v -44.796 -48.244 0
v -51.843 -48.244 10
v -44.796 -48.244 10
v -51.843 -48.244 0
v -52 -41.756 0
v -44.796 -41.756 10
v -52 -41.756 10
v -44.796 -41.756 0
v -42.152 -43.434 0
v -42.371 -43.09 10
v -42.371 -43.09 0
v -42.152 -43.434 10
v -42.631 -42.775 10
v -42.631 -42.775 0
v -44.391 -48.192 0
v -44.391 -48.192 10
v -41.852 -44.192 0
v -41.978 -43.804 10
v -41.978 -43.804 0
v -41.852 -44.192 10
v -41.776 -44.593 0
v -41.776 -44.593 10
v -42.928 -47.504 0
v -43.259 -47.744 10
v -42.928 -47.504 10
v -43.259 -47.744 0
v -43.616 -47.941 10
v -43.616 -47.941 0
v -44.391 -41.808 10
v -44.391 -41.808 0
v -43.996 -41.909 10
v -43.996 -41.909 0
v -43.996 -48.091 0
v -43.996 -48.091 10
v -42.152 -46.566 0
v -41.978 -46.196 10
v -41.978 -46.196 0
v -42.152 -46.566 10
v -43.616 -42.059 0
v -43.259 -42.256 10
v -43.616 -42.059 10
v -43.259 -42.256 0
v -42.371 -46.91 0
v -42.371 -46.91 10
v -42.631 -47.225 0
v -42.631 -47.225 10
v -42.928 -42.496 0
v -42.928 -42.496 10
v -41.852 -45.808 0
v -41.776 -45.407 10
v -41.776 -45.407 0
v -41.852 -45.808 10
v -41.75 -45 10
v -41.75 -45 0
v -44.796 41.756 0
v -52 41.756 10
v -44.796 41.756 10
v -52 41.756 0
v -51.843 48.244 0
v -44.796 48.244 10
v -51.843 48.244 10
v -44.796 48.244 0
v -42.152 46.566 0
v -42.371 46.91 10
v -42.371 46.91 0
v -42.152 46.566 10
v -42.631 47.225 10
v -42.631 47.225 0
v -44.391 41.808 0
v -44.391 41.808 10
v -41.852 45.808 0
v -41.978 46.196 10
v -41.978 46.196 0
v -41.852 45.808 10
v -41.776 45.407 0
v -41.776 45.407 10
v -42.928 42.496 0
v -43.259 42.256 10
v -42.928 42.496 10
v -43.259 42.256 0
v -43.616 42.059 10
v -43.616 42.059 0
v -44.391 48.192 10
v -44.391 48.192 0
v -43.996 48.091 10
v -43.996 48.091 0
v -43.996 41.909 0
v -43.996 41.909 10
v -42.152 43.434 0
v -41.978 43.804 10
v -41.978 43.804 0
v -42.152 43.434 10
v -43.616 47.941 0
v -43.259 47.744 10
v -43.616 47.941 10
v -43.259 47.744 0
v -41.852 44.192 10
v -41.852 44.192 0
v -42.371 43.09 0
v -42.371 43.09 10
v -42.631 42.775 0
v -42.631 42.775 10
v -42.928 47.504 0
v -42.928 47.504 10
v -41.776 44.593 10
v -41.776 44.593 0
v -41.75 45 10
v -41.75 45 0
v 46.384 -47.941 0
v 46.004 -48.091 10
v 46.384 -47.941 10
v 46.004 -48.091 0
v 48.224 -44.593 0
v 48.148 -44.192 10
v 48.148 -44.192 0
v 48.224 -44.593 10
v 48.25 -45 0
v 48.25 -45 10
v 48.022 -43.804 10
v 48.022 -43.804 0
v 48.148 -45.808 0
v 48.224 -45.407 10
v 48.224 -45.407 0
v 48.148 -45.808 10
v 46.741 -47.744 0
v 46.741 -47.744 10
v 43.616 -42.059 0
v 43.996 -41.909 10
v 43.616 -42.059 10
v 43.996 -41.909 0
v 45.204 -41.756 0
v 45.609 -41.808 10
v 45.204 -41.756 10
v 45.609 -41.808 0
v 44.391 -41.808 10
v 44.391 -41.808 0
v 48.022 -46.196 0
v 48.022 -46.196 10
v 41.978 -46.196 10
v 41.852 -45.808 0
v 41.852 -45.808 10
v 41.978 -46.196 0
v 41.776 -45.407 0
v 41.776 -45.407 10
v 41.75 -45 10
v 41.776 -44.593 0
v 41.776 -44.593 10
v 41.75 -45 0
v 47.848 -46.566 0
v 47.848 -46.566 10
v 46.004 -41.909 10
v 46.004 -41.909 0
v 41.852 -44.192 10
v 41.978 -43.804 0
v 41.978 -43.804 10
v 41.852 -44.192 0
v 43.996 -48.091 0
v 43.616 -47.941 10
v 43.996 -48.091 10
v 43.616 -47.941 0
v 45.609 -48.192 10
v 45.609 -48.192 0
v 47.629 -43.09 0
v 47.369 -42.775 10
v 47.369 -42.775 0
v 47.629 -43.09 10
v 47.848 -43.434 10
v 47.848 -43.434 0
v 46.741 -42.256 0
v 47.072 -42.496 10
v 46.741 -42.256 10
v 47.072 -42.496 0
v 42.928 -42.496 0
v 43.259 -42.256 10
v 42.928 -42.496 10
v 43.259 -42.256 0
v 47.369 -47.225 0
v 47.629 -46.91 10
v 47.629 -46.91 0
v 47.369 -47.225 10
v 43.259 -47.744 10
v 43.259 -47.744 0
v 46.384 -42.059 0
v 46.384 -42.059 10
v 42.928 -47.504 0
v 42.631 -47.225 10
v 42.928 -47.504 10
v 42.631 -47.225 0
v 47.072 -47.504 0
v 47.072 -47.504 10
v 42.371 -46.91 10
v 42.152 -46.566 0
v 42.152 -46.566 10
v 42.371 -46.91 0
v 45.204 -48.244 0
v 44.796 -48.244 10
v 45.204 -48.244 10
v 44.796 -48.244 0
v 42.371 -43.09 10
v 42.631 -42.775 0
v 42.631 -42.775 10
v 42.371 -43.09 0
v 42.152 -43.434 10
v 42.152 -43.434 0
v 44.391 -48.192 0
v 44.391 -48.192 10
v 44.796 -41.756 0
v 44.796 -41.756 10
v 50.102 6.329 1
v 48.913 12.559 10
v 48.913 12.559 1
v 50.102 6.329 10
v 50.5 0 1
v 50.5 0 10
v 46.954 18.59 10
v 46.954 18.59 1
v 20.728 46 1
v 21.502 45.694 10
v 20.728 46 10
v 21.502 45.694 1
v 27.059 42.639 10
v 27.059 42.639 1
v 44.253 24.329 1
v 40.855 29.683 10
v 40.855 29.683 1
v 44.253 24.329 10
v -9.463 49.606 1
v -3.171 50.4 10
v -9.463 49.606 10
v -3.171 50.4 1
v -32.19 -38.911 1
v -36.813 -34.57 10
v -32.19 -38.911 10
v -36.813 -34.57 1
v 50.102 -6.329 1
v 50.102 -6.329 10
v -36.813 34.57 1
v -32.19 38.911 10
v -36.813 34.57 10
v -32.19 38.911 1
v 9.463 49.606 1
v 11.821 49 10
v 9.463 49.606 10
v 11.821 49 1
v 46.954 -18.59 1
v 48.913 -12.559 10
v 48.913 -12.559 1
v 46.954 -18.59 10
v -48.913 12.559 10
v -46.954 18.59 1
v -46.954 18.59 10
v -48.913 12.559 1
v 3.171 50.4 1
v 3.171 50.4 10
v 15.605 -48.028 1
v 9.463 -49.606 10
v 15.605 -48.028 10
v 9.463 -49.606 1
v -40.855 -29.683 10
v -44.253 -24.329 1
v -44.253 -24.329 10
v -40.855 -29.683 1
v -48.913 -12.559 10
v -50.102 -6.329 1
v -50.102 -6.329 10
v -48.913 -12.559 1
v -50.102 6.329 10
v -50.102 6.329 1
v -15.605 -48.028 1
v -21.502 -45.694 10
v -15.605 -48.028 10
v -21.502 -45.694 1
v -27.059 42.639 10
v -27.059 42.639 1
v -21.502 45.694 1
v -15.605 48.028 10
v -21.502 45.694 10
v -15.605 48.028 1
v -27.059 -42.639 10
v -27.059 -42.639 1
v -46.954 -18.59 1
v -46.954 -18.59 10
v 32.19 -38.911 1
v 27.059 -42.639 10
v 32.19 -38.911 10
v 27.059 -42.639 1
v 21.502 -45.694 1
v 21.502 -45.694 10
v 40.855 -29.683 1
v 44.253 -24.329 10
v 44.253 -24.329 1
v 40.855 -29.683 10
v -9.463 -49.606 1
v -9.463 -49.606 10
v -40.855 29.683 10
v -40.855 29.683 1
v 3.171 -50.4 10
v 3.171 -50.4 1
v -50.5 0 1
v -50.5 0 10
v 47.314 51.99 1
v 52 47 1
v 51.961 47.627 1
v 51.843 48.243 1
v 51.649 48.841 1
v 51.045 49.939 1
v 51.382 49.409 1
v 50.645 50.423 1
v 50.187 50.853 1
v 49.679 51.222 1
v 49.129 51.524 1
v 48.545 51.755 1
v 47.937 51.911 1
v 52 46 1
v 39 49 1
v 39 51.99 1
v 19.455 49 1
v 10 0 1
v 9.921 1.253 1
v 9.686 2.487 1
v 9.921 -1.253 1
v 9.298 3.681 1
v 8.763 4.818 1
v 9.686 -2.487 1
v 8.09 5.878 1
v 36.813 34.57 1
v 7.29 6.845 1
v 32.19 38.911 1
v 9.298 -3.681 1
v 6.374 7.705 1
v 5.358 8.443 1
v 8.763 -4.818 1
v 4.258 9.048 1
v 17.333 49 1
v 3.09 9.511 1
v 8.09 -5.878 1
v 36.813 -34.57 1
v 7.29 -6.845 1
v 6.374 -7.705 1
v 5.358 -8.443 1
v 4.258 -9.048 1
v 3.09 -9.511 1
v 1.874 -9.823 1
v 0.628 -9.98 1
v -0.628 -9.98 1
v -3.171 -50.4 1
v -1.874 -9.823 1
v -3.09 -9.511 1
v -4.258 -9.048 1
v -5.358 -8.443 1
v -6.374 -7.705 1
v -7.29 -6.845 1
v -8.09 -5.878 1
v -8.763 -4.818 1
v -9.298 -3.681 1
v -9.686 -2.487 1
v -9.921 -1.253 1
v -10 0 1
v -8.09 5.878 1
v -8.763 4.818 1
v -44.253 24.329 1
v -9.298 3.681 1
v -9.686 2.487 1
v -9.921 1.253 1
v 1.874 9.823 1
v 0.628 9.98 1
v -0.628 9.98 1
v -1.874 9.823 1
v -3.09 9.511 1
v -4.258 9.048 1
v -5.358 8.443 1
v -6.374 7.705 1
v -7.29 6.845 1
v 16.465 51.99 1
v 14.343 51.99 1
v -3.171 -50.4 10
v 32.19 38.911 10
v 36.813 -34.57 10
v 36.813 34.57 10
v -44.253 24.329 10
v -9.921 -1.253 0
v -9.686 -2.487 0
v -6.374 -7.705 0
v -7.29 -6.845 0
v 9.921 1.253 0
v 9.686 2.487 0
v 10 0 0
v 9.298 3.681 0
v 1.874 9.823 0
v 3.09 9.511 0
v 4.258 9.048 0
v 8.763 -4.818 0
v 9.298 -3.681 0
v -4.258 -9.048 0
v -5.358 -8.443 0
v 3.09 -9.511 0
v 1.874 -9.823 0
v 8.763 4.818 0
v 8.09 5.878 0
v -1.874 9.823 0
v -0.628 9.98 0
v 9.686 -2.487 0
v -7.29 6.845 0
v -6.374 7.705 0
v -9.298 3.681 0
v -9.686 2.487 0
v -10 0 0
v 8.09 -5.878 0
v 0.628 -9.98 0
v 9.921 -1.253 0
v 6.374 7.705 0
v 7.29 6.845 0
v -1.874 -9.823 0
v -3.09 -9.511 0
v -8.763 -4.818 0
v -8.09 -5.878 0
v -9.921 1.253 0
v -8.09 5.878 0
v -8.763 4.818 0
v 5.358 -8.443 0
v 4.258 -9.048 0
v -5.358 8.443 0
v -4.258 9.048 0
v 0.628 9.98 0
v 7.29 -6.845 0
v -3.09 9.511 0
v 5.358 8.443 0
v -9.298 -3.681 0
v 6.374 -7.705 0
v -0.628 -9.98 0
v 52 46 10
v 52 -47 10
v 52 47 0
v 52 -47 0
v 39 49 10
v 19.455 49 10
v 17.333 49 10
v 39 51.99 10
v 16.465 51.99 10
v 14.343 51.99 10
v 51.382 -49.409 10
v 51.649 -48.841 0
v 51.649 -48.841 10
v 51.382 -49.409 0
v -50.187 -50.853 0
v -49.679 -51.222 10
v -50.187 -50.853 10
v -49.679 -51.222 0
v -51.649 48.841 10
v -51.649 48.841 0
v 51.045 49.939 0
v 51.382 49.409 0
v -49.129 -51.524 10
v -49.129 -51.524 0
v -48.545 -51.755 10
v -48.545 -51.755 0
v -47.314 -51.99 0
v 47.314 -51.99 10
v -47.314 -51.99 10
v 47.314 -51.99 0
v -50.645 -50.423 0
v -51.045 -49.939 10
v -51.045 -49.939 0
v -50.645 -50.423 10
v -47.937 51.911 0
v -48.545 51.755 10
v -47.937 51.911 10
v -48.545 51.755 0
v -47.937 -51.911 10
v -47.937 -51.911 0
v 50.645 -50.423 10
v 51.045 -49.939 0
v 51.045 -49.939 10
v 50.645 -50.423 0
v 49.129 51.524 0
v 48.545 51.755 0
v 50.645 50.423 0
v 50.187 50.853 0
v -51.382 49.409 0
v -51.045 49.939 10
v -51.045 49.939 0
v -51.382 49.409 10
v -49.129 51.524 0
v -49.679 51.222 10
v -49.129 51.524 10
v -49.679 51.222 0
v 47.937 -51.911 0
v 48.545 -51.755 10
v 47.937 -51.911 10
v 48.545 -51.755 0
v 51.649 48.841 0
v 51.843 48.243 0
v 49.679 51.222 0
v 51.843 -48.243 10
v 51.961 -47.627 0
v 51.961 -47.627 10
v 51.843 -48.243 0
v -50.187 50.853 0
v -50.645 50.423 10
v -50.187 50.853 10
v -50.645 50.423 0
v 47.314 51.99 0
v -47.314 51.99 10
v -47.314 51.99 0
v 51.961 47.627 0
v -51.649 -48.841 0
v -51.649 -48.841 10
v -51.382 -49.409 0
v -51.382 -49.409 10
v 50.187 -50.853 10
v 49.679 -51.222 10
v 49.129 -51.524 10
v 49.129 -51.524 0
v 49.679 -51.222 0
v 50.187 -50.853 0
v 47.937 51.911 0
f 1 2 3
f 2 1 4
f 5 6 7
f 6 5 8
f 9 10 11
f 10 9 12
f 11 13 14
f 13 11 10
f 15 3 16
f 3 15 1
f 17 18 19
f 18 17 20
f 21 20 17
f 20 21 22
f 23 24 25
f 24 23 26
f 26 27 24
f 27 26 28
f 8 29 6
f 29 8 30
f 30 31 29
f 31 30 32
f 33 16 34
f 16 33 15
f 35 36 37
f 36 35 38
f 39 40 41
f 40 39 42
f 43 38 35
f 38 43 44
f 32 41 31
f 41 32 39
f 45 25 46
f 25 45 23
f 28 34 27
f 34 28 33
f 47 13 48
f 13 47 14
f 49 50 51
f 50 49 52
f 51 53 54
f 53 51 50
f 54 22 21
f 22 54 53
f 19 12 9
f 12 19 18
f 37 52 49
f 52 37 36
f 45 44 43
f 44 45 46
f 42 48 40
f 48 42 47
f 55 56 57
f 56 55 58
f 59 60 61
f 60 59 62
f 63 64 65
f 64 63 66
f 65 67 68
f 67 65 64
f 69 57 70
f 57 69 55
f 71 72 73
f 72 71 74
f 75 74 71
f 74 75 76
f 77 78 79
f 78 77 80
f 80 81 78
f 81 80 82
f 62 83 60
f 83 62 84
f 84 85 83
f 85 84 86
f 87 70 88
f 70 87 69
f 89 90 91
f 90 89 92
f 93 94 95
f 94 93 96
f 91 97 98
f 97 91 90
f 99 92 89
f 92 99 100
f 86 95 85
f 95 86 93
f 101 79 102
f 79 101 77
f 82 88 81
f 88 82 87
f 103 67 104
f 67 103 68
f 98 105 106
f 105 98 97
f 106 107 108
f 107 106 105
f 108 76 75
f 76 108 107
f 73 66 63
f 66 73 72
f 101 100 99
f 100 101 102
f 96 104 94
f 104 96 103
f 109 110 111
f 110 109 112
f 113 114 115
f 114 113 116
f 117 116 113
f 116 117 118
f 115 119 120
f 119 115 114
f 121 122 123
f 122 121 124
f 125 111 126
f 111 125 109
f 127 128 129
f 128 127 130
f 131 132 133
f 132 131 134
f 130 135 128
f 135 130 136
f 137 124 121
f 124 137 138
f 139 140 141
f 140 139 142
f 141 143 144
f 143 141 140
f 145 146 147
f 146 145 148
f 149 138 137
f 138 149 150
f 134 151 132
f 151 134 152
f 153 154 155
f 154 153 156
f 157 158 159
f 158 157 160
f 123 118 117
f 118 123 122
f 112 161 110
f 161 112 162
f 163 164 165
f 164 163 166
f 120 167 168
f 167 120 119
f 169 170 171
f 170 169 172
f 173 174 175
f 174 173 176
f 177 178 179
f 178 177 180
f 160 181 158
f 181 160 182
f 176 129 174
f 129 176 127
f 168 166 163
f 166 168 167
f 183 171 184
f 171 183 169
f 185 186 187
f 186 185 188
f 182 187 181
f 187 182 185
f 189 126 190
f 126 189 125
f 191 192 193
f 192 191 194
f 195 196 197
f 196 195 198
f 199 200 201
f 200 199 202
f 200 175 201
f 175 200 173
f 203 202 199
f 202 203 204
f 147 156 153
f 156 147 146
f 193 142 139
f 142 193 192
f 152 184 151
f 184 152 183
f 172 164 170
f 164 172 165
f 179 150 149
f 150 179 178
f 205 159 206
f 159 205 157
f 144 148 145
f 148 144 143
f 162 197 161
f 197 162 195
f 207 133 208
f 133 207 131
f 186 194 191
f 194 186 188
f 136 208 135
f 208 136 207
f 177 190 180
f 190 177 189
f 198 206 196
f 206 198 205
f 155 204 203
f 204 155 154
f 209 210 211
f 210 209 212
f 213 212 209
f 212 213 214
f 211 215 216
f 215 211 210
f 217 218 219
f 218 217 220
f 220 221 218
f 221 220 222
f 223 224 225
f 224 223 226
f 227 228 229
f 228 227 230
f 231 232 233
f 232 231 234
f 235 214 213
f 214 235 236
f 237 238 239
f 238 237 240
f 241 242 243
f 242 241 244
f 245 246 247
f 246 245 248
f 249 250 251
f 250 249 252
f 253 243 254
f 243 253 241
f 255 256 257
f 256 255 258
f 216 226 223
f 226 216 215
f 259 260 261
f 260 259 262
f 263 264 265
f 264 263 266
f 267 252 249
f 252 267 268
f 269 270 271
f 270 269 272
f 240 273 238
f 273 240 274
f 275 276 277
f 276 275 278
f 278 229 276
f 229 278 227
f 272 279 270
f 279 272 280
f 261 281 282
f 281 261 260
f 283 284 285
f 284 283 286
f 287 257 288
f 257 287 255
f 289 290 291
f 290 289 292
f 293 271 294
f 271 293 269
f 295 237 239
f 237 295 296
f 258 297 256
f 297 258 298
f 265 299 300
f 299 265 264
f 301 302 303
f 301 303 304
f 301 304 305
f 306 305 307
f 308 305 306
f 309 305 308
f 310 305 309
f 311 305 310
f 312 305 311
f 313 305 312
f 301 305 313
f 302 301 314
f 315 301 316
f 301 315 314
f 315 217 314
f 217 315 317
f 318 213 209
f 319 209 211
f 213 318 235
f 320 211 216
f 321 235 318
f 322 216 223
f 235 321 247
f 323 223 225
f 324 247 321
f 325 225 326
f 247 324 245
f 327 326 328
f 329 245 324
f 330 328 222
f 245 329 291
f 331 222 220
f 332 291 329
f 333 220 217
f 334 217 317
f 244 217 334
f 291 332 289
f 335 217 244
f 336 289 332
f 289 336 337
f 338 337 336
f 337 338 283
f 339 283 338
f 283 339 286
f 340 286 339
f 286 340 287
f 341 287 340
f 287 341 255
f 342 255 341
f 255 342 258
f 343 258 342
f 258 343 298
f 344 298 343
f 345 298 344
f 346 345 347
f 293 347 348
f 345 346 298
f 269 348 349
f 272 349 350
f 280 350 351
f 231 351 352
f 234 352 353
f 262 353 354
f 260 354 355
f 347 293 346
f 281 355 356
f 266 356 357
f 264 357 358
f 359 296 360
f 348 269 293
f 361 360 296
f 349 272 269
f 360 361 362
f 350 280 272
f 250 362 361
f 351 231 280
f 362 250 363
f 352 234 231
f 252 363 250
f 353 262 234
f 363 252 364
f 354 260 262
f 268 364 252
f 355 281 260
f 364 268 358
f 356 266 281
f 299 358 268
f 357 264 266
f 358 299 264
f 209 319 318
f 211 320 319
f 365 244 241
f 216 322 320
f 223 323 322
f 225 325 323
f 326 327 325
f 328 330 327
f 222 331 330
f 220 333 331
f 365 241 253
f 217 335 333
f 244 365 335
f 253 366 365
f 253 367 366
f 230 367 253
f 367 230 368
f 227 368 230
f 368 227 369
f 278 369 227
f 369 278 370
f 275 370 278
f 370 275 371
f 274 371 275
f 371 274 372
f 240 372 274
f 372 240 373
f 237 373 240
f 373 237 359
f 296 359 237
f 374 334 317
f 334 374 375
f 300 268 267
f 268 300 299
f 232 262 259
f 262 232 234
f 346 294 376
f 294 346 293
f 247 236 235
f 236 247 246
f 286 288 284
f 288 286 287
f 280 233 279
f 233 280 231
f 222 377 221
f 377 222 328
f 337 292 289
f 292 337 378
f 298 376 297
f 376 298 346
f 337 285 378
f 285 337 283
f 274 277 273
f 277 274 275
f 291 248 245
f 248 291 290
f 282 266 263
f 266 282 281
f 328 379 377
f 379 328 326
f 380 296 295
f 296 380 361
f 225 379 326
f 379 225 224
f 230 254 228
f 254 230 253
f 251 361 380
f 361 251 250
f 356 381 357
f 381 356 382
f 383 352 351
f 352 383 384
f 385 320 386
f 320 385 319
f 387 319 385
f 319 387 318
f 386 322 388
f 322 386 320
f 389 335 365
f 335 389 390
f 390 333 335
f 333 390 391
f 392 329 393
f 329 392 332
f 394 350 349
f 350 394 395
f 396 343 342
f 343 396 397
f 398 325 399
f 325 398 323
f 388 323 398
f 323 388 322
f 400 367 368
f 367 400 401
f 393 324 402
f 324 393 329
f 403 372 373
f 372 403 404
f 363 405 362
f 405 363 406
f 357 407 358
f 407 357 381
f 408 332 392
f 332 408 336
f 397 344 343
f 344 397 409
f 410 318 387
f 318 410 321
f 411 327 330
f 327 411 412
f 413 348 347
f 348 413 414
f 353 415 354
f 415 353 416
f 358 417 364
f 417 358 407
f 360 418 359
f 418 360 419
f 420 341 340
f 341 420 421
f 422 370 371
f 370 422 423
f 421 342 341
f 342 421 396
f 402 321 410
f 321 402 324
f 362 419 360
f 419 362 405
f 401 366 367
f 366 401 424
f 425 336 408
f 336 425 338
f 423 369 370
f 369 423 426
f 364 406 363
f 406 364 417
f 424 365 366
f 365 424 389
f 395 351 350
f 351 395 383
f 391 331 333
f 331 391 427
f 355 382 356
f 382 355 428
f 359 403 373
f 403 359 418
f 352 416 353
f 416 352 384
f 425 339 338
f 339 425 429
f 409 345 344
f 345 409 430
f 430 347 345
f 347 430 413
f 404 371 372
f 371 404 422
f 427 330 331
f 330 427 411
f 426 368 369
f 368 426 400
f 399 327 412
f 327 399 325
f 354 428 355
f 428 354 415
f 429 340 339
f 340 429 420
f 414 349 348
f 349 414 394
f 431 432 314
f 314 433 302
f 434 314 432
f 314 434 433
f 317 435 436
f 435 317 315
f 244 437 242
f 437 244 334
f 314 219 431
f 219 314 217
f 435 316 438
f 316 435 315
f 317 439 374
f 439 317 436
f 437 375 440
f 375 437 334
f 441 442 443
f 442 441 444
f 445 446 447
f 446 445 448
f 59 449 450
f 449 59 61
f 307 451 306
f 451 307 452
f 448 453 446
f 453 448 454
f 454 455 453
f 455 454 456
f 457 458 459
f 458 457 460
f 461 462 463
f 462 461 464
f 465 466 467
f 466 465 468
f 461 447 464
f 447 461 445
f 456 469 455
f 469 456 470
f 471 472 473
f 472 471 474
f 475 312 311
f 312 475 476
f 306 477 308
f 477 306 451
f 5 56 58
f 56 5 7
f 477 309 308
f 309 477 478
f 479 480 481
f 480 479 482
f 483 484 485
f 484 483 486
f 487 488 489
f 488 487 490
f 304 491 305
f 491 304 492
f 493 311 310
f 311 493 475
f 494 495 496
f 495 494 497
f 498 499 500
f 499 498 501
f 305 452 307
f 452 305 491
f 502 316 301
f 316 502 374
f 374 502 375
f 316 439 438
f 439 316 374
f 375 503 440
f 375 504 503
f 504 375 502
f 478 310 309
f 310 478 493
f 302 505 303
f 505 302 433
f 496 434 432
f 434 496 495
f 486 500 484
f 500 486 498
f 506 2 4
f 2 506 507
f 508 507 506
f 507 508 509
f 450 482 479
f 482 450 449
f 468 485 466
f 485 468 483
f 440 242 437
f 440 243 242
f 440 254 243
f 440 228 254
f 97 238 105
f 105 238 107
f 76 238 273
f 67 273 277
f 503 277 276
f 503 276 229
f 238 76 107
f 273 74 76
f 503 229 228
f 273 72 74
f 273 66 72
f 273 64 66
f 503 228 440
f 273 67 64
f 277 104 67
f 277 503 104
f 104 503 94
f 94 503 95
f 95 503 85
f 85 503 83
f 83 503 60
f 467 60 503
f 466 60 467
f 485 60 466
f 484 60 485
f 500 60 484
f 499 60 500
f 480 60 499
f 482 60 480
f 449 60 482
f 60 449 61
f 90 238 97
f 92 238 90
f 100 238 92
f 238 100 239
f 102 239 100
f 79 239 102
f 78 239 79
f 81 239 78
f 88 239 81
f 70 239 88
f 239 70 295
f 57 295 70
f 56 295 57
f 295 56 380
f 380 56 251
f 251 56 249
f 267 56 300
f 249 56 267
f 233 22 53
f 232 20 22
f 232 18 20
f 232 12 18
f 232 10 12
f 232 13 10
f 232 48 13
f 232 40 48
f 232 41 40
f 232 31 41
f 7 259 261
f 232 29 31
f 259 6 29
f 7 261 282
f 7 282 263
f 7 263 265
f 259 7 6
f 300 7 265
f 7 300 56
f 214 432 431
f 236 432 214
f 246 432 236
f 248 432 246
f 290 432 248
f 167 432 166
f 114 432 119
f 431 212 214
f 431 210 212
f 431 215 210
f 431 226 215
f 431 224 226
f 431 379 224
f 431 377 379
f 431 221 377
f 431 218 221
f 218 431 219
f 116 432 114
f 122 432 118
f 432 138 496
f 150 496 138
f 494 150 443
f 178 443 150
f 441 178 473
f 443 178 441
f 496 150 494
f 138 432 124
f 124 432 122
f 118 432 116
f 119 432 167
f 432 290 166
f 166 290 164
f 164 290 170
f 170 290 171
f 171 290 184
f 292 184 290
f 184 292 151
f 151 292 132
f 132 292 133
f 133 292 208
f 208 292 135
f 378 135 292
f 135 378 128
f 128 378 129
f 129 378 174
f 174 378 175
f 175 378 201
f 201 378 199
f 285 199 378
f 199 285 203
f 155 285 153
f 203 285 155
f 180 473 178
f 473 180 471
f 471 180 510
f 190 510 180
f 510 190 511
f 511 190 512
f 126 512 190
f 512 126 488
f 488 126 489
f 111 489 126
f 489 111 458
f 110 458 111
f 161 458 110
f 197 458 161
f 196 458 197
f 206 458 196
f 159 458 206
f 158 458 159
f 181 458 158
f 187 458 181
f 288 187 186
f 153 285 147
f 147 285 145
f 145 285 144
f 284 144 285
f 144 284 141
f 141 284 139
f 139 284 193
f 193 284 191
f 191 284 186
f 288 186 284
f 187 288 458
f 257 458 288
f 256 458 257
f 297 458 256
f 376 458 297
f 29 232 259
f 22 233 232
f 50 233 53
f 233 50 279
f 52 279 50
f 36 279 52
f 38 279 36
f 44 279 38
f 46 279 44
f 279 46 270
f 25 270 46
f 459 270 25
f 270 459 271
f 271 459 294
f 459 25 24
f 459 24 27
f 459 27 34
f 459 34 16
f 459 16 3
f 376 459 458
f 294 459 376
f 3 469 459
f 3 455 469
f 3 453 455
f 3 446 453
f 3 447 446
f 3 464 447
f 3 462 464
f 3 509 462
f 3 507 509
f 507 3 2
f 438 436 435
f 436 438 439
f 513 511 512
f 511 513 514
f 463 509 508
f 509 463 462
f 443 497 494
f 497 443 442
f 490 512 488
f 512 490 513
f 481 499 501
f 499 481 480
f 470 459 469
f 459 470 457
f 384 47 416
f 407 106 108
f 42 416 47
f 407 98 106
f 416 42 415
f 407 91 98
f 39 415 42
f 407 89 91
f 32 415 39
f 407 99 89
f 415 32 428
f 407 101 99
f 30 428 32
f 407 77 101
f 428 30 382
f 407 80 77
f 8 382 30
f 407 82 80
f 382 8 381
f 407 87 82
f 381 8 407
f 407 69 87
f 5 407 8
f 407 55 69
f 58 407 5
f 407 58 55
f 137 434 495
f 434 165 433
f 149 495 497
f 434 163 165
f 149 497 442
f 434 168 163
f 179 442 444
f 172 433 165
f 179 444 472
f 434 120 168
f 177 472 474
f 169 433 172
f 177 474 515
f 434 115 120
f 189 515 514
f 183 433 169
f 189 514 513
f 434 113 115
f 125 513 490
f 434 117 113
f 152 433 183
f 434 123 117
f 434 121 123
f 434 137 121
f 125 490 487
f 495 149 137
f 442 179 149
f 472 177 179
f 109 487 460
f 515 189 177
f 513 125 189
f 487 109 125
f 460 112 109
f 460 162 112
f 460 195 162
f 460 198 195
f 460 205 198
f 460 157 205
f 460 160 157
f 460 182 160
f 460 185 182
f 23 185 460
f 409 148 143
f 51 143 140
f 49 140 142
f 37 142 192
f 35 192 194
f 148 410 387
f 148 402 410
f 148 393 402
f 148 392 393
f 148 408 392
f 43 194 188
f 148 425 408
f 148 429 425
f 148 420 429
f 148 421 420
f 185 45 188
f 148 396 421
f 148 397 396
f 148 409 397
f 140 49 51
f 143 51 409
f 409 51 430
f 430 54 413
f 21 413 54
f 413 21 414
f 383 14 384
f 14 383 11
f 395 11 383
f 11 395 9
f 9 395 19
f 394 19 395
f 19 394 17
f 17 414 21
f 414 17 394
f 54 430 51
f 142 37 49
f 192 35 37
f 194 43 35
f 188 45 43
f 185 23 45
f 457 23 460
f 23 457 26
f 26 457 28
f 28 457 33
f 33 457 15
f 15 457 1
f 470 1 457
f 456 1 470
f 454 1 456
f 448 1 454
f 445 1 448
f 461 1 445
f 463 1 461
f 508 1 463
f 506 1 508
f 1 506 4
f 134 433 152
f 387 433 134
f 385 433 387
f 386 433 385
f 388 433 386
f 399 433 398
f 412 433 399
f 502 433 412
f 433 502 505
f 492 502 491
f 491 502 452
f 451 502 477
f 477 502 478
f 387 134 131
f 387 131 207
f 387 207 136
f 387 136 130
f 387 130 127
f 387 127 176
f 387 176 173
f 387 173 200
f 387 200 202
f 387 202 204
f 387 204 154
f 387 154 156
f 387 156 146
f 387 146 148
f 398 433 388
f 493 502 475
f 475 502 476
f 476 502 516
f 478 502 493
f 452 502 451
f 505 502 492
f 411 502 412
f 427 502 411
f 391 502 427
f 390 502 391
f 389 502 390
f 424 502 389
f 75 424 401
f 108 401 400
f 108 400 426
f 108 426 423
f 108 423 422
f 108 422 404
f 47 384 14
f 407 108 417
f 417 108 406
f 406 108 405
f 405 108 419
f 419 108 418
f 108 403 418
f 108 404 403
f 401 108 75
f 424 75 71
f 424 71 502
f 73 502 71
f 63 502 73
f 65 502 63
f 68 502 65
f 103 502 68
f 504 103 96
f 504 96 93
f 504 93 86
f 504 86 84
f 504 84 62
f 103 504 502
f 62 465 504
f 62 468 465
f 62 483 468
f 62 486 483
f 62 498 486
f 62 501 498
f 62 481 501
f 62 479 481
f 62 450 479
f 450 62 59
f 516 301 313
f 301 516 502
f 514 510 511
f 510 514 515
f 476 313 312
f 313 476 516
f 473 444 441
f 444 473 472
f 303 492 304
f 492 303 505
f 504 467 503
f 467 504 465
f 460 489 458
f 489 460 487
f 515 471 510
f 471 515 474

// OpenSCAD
$fn = 50;


difference() {
	union() {
		translate(v = [0, 0, 0]) {
			rotate(a = [0, 0, 0]) {
				hull() {
					translate(v = [-47.0000000000, 47.0000000000, 0]) {
						rotate(a = [0, 0, 0]) {
							translate(v = [0, 0, 0]) {
								rotate(a = [0, 0, 0]) {
									cylinder(h = 10, r = 5);
								}
							}
						}
					}
					translate(v = [47.0000000000, 47.0000000000, 0]) {
						rotate(a = [0, 0, 0]) {
							translate(v = [0, 0, 0]) {
								rotate(a = [0, 0, 0]) {
									cylinder(h = 10, r = 5);
								}
							}
						}
					}
					translate(v = [-47.0000000000, -47.0000000000, 0]) {
						rotate(a = [0, 0, 0]) {
							translate(v = [0, 0, 0]) {
								rotate(a = [0, 0, 0]) {
									cylinder(h = 10, r = 5);
								}
							}
						}
					}
					translate(v = [47.0000000000, -47.0000000000, 0]) {
						rotate(a = [0, 0, 0]) {
							translate(v = [0, 0, 0]) {
								rotate(a = [0, 0, 0]) {
									cylinder(h = 10, r = 5);
								}
							}
						}
					}
				}
			}
		}
	}
	union() {
		translate(v = [-52.5000000000, -45.0000000000, -125]) {
			rotate(a = [0, 0, 0]) {
				hull() {
					translate(v = [7.5000000000, 0, 0]) {
						rotate(a = [0, 0, 0]) {
							translate(v = [0, 0, 0]) {
								rotate(a = [0, 0, 0]) {
									cylinder(h = 250, r = 3.2500000000);
								}
							}
						}
					}
					translate(v = [-7.5000000000, 0, 0]) {
						rotate(a = [0, 0, 0]) {
							translate(v = [0, 0, 0]) {
								rotate(a = [0, 0, 0]) {
									cylinder(h = 250, r = 3.2500000000);
								}
							}
						}
					}
				}
			}
		}
		translate(v = [-52.5000000000, 45.0000000000, -125]) {
			rotate(a = [0, 0, 0]) {
				hull() {
					translate(v = [7.5000000000, 0, 0]) {
						rotate(a = [0, 0, 0]) {
							translate(v = [0, 0, 0]) {
								rotate(a = [0, 0, 0]) {
									cylinder(h = 250, r = 3.2500000000);
								}
							}
						}
					}
					translate(v = [-7.5000000000, 0, 0]) {
						rotate(a = [0, 0, 0]) {
							translate(v = [0, 0, 0]) {
								rotate(a = [0, 0, 0]) {
									cylinder(h = 250, r = 3.2500000000);
								}
							}
						}
					}
				}
			}
		}
		translate(v = [45.0000000000, -45.0000000000, -125.0000000000]) {
			rotate(a = [0, 0, 0]) {
				cylinder(h = 250, r = 3.2500000000);
			}
		}
		translate(v = [0, 0, 1.0000000000]) {
			rotate(a = [0, 0, 0]) {
				cylinder(h = 12, r = 50.5000000000);
			}
		}
		translate(v = [0, 0, -5.0000000000]) {
			rotate(a = [0, 0, 0]) {
				cylinder(h = 10, r = 10.0000000000);
			}
		}
		translate(v = [0.0000000000, 46.0000000000, 1]) {
			rotate(a = [0, 0, 0]) {
				cube(size = [52.0000000000, 3, 12]);
			}
		}
		translate(v = [39.0000000000, 46.0000000000, 1]) {
			rotate(a = [0, 0, 0]) {
				cube(size = [13.0000000000, 6, 12]);
			}
		}
		translate(v = [13.5833333333, 52.7500000000, 1]) {
			rotate(a = [0, 0, -45]) {
				cube(size = [7.5000000000, 1.5000000000, 12]);
			}
		}
	}
}
